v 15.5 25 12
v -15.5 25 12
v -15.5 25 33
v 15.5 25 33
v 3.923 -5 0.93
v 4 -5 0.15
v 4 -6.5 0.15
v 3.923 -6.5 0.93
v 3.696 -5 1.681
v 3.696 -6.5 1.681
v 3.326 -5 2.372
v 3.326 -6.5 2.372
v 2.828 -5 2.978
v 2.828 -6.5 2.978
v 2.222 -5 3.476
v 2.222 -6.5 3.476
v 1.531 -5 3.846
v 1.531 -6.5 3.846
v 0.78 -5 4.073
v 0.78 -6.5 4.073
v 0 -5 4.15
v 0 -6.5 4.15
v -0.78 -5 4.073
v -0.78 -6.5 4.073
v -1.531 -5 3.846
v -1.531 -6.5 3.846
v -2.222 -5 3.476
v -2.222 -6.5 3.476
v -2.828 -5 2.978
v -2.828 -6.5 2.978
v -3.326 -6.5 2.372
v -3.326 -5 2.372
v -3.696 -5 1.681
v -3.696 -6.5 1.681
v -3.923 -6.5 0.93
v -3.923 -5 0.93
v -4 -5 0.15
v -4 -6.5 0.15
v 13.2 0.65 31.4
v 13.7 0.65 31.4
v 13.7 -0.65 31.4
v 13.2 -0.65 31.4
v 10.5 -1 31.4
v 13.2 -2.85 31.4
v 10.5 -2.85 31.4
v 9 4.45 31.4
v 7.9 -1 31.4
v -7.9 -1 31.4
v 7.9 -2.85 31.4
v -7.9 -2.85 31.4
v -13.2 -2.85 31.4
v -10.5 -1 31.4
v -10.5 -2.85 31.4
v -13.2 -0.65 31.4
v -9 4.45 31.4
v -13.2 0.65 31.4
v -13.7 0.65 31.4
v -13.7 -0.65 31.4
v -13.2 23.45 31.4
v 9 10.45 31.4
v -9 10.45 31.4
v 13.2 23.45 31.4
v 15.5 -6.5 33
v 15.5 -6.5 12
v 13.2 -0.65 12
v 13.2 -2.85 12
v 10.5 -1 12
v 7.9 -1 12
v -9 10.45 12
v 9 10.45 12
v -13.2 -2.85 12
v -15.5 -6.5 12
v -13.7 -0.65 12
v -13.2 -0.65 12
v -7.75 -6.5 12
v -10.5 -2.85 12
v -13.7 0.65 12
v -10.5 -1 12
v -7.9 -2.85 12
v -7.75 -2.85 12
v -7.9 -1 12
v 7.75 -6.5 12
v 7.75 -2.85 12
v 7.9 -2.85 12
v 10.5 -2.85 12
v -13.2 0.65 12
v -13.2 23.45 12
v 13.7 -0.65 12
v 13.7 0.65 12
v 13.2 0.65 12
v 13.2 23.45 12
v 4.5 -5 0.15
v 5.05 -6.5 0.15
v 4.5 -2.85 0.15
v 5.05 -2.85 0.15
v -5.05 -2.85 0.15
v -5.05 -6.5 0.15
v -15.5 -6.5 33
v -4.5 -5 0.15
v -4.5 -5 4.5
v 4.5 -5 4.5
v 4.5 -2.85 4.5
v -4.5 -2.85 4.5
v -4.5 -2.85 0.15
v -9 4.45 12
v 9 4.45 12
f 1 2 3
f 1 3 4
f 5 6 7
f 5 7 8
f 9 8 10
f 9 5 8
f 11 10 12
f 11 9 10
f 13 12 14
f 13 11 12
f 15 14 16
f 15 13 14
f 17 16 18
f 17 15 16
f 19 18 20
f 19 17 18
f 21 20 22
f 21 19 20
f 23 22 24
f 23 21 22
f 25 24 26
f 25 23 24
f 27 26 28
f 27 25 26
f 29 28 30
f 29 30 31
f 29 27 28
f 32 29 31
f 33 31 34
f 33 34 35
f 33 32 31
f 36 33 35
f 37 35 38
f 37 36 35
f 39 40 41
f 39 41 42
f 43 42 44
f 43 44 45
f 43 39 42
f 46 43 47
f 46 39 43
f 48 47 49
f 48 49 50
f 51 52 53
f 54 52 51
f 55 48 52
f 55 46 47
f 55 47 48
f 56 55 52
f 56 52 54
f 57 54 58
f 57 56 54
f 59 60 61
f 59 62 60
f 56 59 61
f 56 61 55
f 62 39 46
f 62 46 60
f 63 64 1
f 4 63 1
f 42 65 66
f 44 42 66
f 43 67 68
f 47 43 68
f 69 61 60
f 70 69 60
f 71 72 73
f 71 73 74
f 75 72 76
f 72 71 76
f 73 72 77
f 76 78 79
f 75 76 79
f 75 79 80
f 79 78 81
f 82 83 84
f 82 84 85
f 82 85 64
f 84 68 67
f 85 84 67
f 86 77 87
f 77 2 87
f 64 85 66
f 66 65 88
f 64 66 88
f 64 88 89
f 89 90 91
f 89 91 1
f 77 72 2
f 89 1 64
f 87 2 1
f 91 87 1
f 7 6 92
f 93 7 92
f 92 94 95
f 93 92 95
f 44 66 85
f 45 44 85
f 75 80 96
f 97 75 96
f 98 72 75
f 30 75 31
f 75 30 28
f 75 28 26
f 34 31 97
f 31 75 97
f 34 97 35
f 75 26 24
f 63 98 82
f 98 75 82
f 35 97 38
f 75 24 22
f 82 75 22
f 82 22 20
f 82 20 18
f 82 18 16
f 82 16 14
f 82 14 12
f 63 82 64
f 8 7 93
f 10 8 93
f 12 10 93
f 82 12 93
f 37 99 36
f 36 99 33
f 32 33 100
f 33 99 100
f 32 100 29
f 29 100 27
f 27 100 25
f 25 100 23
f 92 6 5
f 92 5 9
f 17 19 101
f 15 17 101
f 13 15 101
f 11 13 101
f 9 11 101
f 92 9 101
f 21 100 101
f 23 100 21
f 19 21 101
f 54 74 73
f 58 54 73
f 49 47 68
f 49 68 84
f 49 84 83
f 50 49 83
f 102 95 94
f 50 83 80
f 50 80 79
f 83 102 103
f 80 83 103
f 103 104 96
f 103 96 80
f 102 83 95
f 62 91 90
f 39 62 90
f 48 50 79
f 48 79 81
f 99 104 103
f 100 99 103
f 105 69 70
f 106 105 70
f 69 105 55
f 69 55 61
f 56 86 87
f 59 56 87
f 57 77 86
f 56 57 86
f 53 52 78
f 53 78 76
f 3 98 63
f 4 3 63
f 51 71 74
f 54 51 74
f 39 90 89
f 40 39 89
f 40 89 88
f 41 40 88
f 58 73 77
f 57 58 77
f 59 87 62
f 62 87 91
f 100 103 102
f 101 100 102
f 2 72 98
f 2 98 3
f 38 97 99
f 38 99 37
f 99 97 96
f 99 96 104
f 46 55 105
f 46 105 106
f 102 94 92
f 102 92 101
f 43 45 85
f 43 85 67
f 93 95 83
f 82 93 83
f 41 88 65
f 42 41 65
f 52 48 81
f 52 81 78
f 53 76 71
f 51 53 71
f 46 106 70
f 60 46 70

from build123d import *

# Parameters (mm, degrees)
SKETCH009_W     = 31
SKETCH009_H     = 31.5
PAD001_DEPTH    = 21
SKETCH010_W     = 18
SKETCH010_H     = 6
POCKET007_DEPTH = 19.4
PAD002_DEPTH    = 3.65
SKETCH012_W     = 9
SKETCH012_H     = 9
POCKET008_DEPTH = 2.15


with BuildPart() as part:
    # Sketch009 → Pad001 (new body)
    with BuildSketch(Plane.XY):
        with Locations((0, 9.25)):
            Rectangle(SKETCH009_W, SKETCH009_H)
    extrude(amount=PAD001_DEPTH)

    # Sketch010 → Pocket007 (cut)
    with BuildSketch(Plane.XY):
        Polygon((-7.9, -2.85), (-7.9, -1), (-10.5, -1), (-10.5, -2.85), (-13.2, -2.85), (-13.2, -0.65), (-13.7, -0.65), (-13.7, 0.65), (-13.2, 0.65), (-13.2, 23.45), (13.2, 23.45), (13.2, 0.65), (13.7, 0.65), (13.7, -0.65), (13.2, -0.65), (13.2, -2.85), (10.5, -2.85), (10.5, -1), (7.9, -1), (7.9, -2.85), align=None)
        with Locations((0, 7.45)):
            Rectangle(SKETCH010_W, SKETCH010_H, mode=Mode.SUBTRACT)
    extrude(amount=POCKET007_DEPTH, mode=Mode.SUBTRACT)

    # Sketch011 → Pad002 (join)
    with BuildSketch(Plane.XZ.offset(2.85)):
        with BuildLine():
            Line((-7.75, 0), (-5.05, -11.85))
            Line((-5.05, -11.85), (-4, -11.85))
            ThreePointArc((4, -11.85), (0, -7.85), (-4, -11.85))
            Line((4, -11.85), (5.05, -11.85))
            Line((5.05, -11.85), (7.75, 0))
            Line((7.75, 0), (-7.75, 0))
        make_face()
    extrude(amount=PAD002_DEPTH)

    # Sketch012 → Pocket008 (cut)
    with BuildSketch(Plane.XZ.offset(2.85)):
        with Locations((0, -12)):
            Rectangle(SKETCH012_W, SKETCH012_H)
    extrude(amount=POCKET008_DEPTH, mode=Mode.SUBTRACT)


with BuildPart() as part_1:
    # Body001 placement: moved
    add(part.part.moved(Location((0, 0, 12))))


solid = part_1.part
